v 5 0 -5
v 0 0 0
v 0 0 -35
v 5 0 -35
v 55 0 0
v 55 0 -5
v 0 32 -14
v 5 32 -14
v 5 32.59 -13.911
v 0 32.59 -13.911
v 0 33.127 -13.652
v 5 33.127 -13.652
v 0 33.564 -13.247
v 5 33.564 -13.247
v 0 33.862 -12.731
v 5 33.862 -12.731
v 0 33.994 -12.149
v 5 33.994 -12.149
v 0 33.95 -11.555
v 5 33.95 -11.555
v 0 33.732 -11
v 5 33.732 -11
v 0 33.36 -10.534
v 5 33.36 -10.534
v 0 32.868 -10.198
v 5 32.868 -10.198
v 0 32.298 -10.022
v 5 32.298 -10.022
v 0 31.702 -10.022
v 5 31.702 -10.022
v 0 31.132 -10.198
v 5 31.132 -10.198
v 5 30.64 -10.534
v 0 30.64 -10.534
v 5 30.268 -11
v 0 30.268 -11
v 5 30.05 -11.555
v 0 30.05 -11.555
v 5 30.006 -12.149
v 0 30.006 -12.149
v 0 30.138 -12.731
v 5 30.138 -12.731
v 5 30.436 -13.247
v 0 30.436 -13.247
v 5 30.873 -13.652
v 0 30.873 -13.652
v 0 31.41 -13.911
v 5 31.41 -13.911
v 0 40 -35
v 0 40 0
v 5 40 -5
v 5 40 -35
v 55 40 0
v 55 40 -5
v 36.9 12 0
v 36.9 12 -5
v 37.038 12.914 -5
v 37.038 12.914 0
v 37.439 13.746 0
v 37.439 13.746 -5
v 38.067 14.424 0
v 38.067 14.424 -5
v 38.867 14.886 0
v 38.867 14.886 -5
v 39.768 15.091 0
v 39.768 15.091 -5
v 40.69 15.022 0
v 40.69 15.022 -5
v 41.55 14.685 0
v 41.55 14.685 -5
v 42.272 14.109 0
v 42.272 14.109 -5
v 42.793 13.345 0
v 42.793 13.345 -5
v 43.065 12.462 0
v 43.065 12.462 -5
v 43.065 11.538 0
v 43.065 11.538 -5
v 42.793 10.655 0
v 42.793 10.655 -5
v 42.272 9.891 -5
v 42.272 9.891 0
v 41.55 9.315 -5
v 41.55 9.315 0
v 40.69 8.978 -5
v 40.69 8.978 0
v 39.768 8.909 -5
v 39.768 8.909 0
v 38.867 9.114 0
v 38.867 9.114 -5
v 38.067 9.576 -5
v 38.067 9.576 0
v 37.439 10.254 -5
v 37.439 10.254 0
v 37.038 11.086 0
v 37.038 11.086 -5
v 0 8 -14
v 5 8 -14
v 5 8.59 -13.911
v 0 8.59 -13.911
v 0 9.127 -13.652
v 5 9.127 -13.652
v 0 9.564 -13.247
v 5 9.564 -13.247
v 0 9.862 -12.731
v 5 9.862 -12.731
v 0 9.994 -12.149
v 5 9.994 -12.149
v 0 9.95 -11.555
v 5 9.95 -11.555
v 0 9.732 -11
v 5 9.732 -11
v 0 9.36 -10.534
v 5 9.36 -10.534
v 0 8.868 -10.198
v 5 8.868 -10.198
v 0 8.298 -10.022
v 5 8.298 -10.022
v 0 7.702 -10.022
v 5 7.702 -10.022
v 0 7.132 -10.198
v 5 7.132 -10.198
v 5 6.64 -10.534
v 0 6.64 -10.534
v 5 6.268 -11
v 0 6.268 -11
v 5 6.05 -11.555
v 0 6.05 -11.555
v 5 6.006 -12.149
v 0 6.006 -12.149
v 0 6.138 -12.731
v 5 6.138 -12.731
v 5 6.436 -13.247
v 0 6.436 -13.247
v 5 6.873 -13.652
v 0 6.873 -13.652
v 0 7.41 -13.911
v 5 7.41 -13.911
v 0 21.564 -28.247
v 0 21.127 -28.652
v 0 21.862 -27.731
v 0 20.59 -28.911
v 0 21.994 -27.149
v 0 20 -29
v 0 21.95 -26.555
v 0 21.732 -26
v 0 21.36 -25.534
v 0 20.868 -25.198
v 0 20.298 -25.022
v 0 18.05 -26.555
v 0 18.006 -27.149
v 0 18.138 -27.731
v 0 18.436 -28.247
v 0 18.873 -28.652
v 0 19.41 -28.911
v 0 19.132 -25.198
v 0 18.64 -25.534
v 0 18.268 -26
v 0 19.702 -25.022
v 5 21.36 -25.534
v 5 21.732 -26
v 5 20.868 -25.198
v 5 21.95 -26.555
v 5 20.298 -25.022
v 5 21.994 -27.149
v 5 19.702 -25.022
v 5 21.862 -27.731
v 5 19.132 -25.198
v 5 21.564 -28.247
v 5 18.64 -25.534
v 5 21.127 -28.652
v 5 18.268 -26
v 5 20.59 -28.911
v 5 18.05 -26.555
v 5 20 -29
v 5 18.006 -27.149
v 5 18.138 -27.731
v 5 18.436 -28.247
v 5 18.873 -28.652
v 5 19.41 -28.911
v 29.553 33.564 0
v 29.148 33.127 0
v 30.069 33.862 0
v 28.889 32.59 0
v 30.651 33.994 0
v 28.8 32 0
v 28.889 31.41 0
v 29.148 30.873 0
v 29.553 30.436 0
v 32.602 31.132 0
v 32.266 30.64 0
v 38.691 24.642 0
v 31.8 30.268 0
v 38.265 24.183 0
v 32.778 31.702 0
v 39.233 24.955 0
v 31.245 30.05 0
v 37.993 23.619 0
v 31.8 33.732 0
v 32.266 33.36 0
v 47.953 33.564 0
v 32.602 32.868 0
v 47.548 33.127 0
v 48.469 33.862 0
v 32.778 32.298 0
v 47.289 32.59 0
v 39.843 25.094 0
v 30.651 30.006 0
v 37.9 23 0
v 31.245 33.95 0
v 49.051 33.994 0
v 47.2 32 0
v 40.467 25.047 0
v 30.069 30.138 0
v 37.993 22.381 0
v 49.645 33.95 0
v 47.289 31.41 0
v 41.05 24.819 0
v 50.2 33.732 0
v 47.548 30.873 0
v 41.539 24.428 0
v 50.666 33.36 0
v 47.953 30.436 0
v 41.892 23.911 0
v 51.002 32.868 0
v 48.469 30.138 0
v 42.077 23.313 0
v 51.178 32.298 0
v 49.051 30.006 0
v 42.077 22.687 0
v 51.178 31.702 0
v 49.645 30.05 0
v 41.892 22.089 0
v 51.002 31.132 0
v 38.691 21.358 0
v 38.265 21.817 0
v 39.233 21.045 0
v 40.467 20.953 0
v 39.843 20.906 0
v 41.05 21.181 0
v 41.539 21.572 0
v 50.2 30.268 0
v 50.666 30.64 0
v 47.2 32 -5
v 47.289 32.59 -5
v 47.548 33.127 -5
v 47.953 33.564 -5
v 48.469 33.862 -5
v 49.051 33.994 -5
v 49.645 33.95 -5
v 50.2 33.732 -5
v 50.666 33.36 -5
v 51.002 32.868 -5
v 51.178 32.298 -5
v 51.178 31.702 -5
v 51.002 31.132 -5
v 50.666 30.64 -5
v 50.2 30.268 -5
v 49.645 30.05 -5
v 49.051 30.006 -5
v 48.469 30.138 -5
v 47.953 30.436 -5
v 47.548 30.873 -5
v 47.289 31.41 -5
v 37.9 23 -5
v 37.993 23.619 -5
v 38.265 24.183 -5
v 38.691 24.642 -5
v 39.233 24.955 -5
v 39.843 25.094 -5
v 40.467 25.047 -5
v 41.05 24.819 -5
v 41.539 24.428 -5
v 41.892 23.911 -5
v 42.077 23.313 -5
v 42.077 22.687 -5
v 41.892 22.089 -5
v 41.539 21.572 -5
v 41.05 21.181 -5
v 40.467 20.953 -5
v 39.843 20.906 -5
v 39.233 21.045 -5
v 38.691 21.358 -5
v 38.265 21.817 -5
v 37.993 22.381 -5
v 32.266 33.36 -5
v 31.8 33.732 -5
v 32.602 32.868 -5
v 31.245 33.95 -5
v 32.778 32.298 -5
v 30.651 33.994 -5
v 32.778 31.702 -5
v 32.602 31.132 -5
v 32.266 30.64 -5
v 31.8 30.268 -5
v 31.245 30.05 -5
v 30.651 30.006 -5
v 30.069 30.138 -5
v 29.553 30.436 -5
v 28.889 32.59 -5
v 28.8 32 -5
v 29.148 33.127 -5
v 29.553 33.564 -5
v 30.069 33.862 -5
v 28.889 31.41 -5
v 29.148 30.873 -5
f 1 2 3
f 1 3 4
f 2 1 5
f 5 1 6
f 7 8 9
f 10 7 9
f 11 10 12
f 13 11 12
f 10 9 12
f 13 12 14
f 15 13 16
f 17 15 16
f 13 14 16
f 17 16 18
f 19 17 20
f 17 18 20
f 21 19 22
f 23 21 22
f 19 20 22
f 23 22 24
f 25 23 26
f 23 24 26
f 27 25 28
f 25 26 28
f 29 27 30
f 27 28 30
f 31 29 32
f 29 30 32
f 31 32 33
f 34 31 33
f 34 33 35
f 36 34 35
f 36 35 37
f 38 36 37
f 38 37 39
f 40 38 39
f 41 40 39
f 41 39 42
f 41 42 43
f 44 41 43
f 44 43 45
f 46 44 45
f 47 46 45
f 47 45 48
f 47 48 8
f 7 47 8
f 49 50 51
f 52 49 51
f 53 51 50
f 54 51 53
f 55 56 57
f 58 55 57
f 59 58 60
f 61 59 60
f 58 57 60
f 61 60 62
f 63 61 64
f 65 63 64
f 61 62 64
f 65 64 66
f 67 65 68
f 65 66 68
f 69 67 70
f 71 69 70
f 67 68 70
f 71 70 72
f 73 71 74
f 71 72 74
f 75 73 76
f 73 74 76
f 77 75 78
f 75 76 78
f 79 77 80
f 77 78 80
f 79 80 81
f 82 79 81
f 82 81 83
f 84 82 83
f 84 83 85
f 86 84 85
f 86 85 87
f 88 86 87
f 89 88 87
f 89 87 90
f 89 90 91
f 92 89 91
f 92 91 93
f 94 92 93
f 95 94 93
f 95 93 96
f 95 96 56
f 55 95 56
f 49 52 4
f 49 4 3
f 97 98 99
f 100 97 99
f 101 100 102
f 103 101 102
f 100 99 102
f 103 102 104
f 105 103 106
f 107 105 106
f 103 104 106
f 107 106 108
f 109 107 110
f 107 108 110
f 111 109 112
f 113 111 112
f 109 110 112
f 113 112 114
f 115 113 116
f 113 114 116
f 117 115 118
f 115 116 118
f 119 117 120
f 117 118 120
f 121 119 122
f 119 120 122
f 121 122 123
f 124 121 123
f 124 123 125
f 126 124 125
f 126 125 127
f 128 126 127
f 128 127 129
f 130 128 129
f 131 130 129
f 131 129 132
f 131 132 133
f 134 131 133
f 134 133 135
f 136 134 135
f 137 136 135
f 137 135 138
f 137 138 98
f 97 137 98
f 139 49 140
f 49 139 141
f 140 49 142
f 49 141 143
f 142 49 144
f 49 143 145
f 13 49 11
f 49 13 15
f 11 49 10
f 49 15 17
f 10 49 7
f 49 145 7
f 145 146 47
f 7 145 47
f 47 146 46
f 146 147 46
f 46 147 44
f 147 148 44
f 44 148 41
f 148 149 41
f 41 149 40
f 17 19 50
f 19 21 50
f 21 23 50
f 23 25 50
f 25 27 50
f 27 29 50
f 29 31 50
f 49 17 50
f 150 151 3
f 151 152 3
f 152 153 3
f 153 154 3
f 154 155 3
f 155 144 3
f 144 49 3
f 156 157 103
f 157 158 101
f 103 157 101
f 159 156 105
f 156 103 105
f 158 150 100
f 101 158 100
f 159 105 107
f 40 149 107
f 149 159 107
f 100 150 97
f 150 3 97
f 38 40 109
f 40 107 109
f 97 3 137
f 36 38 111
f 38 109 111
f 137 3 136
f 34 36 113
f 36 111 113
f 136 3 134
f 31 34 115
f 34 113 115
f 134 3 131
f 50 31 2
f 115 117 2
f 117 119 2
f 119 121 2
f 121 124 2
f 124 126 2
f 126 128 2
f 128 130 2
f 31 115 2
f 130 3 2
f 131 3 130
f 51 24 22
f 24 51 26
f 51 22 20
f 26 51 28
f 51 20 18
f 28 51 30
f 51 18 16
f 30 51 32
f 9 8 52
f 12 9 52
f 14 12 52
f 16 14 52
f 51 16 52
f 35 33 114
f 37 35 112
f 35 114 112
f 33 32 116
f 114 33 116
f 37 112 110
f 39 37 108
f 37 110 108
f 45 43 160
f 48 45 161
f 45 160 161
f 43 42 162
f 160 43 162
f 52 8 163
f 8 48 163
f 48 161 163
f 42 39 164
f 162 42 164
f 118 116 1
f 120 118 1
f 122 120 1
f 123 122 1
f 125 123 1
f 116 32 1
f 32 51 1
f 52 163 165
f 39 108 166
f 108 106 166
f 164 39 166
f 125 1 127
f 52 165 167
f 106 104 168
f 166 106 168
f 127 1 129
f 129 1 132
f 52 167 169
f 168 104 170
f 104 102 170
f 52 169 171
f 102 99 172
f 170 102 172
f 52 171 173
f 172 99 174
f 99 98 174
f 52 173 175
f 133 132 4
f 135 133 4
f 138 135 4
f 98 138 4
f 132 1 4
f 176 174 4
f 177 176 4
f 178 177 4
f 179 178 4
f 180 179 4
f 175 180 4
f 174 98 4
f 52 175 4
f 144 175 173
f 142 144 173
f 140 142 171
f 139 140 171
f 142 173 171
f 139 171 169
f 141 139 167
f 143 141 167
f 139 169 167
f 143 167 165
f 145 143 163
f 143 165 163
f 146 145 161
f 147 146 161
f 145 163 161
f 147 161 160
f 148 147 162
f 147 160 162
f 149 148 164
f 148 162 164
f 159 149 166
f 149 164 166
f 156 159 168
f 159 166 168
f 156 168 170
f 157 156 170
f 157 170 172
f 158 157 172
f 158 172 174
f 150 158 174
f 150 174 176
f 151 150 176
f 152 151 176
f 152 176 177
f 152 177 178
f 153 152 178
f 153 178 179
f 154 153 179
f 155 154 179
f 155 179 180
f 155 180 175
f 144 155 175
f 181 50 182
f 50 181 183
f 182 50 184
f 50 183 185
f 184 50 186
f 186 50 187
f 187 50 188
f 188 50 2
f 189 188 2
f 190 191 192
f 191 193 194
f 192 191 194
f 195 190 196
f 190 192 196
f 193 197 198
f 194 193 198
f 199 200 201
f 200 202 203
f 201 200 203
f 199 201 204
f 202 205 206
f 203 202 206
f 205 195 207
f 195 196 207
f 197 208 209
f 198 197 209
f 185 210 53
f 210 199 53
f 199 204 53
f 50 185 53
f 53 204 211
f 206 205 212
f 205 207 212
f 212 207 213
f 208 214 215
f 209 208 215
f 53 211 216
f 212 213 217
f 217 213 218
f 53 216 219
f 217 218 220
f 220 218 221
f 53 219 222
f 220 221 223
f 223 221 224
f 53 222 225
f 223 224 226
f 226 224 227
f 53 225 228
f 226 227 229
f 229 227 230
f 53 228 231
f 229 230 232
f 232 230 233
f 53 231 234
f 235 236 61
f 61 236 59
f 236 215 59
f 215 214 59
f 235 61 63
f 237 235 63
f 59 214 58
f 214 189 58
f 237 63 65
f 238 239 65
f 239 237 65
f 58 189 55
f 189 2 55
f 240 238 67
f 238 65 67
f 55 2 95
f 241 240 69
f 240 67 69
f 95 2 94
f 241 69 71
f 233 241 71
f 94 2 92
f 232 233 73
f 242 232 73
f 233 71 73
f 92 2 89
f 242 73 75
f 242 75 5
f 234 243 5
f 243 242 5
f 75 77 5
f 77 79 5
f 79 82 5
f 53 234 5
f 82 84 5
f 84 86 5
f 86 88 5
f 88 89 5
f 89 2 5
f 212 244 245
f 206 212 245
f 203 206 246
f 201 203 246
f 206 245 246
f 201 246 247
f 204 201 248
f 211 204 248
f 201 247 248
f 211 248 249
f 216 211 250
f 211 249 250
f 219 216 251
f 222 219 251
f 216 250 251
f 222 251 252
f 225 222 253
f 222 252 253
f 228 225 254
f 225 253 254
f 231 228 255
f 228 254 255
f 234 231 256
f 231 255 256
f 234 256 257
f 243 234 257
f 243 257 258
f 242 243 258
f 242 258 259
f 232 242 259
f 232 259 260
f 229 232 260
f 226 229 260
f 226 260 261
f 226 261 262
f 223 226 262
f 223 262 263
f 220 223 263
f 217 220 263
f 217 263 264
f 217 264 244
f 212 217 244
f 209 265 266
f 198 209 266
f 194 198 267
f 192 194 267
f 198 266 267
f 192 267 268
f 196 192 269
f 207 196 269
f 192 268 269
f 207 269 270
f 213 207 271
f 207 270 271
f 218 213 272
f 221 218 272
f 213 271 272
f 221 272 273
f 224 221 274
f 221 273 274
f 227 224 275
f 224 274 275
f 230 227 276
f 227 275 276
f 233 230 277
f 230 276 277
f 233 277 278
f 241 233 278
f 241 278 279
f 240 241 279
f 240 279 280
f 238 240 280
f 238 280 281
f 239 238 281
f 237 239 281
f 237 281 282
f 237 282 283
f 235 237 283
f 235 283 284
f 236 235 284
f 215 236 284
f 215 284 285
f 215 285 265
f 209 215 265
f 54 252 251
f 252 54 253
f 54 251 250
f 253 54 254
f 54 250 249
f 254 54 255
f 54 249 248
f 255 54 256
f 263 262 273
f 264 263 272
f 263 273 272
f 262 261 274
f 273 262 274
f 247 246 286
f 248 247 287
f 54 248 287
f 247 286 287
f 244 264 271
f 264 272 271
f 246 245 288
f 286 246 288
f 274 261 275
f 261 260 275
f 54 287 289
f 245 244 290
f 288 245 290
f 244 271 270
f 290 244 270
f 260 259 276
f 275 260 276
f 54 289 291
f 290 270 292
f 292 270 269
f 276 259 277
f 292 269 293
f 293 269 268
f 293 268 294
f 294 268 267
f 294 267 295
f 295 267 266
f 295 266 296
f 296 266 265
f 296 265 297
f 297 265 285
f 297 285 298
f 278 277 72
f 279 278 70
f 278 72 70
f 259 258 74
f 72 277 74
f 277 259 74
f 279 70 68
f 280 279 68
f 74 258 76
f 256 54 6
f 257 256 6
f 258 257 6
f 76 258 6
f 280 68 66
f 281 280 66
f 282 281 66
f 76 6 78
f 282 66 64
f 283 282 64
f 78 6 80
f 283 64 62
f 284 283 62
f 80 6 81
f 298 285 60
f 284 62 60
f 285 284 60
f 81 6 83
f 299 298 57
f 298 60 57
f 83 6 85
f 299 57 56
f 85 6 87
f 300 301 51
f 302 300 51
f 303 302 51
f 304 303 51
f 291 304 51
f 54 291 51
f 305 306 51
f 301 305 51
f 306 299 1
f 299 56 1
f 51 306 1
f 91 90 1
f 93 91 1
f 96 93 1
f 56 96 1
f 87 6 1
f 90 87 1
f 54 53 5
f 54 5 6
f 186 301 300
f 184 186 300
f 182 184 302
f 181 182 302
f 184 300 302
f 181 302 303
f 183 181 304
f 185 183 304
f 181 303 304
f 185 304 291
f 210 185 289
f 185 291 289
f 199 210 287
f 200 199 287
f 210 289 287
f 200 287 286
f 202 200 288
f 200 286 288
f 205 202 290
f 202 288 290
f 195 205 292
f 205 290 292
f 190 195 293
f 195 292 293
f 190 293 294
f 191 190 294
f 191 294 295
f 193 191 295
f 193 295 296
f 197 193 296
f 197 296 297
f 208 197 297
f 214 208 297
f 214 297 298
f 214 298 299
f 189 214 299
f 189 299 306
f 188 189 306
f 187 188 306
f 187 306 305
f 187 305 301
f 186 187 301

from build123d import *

# Parameters (mm, degrees)
BOSS_EXTRUDE2_DEPTH = 40
SKETCH3_R           = 3.1
SKETCH3_R_2         = 2.1
SKETCH3_R_3         = 2
CUT_EXTRUDE1_DEPTH  = 75.330343737
SKETCH4_R           = 2
CUT_EXTRUDE3_DEPTH  = 73.972597597


with BuildPart() as part:
    # Sketch1 → Boss-Extrude2 (new body)
    with BuildSketch(Plane(origin=(0, 0, 0), x_dir=(1, 0, 0), z_dir=(0, 1, 0))):
        Polygon((0, 0), (55, 0), (55, 5), (5, 5), (5, 35), (0, 35), align=None)
    extrude(amount=BOSS_EXTRUDE2_DEPTH)

    # Sketch3 → Cut-Extrude1 (cut, through all)
    with BuildSketch(Plane(origin=(0, 0, -5), x_dir=(-1, 0, 0), z_dir=(0, 0, -1))):
        with Locations((-40, 12)):
            Circle(SKETCH3_R)
        with Locations((-40, 23)):
            Circle(SKETCH3_R_2)
        with Locations((-49.2, 32)):
            Circle(SKETCH3_R_3)
        with Locations((-30.8, 32)):
            Circle(SKETCH3_R_3)
    extrude(amount=-CUT_EXTRUDE1_DEPTH, mode=Mode.SUBTRACT)

    # Sketch4 → Cut-Extrude3 (cut, through all)
    with BuildSketch(Plane(origin=(5, 0, 0), x_dir=(0, 0, -1), z_dir=(1, 0, 0))):
        with Locations((12, 32)):
            Circle(SKETCH4_R)
        with Locations((27, 20)):
            Circle(SKETCH4_R)
        with Locations((12, 8)):
            Circle(SKETCH4_R)
    extrude(amount=-CUT_EXTRUDE3_DEPTH, mode=Mode.SUBTRACT)


solid = part.part
